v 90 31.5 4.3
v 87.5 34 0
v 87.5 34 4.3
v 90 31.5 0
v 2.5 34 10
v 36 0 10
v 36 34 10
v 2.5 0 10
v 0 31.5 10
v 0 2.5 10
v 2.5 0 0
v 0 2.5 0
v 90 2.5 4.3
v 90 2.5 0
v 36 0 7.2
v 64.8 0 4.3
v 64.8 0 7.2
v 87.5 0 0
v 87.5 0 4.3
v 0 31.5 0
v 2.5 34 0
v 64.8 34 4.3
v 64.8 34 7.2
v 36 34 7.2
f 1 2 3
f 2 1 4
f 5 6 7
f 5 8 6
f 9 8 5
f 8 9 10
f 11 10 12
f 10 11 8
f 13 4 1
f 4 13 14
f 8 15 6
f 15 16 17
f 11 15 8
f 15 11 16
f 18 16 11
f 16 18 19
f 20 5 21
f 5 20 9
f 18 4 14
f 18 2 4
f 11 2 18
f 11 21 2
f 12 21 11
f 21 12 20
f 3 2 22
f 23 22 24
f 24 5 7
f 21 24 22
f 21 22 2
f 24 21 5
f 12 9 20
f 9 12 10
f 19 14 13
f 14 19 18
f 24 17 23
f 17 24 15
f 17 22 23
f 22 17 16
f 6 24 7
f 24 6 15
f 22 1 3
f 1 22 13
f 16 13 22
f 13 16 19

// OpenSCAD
$fn = 32;

// ----------------------------------------------------------------------
// Stepped bar: twostep, 90 x 34 x 10/4.3 mm
// ----------------------------------------------------------------------

// --- parameters (mm) ---
bar_l = 90;               // bar length, X
bar_w = 34;               // bar width, Y
plate_t = 10;             // thickness of the thick zone, Z
thin_t = 4.3;             // thickness of the thin zone
corner_c = 2.5;           // corner chamfer of the bar
step_cut = 5.7;           // material removed from the thin zone
stair1_x = 36;            // position of the first stair
stair2_x = 64.8;          // position of the second stair
mid_t = 7.2;              // thickness of the middle zone
depth_1 = 2.8;            // depth of cut 1 from the top face
depth_2 = 5.7;            // depth of cut 2 from the top face

profile = [[2.5, 0], [87.5, 0], [90, 2.5], [90, 31.5], [87.5, 34], [2.5, 34], [0, 31.5], [0, 2.5]];  // primary outline, 8 points, counter clockwise
void_1 = [[36, -1], [64.8, -1], [64.8, 35], [36, 35]];  // first stair, 4 points
void_2 = [[64.8, -1], [91, -1], [91, 35], [64.8, 35]];  // second stair, 4 points

// --- the one profile operation ---
difference() {
  linear_extrude(height = plate_t) polygon(points = profile);
  translate([0, 0, plate_t - depth_1])
    linear_extrude(height = depth_1 + 1) polygon(points = void_1);
  translate([0, 0, plate_t - depth_2])
    linear_extrude(height = depth_2 + 1) polygon(points = void_2);
}
